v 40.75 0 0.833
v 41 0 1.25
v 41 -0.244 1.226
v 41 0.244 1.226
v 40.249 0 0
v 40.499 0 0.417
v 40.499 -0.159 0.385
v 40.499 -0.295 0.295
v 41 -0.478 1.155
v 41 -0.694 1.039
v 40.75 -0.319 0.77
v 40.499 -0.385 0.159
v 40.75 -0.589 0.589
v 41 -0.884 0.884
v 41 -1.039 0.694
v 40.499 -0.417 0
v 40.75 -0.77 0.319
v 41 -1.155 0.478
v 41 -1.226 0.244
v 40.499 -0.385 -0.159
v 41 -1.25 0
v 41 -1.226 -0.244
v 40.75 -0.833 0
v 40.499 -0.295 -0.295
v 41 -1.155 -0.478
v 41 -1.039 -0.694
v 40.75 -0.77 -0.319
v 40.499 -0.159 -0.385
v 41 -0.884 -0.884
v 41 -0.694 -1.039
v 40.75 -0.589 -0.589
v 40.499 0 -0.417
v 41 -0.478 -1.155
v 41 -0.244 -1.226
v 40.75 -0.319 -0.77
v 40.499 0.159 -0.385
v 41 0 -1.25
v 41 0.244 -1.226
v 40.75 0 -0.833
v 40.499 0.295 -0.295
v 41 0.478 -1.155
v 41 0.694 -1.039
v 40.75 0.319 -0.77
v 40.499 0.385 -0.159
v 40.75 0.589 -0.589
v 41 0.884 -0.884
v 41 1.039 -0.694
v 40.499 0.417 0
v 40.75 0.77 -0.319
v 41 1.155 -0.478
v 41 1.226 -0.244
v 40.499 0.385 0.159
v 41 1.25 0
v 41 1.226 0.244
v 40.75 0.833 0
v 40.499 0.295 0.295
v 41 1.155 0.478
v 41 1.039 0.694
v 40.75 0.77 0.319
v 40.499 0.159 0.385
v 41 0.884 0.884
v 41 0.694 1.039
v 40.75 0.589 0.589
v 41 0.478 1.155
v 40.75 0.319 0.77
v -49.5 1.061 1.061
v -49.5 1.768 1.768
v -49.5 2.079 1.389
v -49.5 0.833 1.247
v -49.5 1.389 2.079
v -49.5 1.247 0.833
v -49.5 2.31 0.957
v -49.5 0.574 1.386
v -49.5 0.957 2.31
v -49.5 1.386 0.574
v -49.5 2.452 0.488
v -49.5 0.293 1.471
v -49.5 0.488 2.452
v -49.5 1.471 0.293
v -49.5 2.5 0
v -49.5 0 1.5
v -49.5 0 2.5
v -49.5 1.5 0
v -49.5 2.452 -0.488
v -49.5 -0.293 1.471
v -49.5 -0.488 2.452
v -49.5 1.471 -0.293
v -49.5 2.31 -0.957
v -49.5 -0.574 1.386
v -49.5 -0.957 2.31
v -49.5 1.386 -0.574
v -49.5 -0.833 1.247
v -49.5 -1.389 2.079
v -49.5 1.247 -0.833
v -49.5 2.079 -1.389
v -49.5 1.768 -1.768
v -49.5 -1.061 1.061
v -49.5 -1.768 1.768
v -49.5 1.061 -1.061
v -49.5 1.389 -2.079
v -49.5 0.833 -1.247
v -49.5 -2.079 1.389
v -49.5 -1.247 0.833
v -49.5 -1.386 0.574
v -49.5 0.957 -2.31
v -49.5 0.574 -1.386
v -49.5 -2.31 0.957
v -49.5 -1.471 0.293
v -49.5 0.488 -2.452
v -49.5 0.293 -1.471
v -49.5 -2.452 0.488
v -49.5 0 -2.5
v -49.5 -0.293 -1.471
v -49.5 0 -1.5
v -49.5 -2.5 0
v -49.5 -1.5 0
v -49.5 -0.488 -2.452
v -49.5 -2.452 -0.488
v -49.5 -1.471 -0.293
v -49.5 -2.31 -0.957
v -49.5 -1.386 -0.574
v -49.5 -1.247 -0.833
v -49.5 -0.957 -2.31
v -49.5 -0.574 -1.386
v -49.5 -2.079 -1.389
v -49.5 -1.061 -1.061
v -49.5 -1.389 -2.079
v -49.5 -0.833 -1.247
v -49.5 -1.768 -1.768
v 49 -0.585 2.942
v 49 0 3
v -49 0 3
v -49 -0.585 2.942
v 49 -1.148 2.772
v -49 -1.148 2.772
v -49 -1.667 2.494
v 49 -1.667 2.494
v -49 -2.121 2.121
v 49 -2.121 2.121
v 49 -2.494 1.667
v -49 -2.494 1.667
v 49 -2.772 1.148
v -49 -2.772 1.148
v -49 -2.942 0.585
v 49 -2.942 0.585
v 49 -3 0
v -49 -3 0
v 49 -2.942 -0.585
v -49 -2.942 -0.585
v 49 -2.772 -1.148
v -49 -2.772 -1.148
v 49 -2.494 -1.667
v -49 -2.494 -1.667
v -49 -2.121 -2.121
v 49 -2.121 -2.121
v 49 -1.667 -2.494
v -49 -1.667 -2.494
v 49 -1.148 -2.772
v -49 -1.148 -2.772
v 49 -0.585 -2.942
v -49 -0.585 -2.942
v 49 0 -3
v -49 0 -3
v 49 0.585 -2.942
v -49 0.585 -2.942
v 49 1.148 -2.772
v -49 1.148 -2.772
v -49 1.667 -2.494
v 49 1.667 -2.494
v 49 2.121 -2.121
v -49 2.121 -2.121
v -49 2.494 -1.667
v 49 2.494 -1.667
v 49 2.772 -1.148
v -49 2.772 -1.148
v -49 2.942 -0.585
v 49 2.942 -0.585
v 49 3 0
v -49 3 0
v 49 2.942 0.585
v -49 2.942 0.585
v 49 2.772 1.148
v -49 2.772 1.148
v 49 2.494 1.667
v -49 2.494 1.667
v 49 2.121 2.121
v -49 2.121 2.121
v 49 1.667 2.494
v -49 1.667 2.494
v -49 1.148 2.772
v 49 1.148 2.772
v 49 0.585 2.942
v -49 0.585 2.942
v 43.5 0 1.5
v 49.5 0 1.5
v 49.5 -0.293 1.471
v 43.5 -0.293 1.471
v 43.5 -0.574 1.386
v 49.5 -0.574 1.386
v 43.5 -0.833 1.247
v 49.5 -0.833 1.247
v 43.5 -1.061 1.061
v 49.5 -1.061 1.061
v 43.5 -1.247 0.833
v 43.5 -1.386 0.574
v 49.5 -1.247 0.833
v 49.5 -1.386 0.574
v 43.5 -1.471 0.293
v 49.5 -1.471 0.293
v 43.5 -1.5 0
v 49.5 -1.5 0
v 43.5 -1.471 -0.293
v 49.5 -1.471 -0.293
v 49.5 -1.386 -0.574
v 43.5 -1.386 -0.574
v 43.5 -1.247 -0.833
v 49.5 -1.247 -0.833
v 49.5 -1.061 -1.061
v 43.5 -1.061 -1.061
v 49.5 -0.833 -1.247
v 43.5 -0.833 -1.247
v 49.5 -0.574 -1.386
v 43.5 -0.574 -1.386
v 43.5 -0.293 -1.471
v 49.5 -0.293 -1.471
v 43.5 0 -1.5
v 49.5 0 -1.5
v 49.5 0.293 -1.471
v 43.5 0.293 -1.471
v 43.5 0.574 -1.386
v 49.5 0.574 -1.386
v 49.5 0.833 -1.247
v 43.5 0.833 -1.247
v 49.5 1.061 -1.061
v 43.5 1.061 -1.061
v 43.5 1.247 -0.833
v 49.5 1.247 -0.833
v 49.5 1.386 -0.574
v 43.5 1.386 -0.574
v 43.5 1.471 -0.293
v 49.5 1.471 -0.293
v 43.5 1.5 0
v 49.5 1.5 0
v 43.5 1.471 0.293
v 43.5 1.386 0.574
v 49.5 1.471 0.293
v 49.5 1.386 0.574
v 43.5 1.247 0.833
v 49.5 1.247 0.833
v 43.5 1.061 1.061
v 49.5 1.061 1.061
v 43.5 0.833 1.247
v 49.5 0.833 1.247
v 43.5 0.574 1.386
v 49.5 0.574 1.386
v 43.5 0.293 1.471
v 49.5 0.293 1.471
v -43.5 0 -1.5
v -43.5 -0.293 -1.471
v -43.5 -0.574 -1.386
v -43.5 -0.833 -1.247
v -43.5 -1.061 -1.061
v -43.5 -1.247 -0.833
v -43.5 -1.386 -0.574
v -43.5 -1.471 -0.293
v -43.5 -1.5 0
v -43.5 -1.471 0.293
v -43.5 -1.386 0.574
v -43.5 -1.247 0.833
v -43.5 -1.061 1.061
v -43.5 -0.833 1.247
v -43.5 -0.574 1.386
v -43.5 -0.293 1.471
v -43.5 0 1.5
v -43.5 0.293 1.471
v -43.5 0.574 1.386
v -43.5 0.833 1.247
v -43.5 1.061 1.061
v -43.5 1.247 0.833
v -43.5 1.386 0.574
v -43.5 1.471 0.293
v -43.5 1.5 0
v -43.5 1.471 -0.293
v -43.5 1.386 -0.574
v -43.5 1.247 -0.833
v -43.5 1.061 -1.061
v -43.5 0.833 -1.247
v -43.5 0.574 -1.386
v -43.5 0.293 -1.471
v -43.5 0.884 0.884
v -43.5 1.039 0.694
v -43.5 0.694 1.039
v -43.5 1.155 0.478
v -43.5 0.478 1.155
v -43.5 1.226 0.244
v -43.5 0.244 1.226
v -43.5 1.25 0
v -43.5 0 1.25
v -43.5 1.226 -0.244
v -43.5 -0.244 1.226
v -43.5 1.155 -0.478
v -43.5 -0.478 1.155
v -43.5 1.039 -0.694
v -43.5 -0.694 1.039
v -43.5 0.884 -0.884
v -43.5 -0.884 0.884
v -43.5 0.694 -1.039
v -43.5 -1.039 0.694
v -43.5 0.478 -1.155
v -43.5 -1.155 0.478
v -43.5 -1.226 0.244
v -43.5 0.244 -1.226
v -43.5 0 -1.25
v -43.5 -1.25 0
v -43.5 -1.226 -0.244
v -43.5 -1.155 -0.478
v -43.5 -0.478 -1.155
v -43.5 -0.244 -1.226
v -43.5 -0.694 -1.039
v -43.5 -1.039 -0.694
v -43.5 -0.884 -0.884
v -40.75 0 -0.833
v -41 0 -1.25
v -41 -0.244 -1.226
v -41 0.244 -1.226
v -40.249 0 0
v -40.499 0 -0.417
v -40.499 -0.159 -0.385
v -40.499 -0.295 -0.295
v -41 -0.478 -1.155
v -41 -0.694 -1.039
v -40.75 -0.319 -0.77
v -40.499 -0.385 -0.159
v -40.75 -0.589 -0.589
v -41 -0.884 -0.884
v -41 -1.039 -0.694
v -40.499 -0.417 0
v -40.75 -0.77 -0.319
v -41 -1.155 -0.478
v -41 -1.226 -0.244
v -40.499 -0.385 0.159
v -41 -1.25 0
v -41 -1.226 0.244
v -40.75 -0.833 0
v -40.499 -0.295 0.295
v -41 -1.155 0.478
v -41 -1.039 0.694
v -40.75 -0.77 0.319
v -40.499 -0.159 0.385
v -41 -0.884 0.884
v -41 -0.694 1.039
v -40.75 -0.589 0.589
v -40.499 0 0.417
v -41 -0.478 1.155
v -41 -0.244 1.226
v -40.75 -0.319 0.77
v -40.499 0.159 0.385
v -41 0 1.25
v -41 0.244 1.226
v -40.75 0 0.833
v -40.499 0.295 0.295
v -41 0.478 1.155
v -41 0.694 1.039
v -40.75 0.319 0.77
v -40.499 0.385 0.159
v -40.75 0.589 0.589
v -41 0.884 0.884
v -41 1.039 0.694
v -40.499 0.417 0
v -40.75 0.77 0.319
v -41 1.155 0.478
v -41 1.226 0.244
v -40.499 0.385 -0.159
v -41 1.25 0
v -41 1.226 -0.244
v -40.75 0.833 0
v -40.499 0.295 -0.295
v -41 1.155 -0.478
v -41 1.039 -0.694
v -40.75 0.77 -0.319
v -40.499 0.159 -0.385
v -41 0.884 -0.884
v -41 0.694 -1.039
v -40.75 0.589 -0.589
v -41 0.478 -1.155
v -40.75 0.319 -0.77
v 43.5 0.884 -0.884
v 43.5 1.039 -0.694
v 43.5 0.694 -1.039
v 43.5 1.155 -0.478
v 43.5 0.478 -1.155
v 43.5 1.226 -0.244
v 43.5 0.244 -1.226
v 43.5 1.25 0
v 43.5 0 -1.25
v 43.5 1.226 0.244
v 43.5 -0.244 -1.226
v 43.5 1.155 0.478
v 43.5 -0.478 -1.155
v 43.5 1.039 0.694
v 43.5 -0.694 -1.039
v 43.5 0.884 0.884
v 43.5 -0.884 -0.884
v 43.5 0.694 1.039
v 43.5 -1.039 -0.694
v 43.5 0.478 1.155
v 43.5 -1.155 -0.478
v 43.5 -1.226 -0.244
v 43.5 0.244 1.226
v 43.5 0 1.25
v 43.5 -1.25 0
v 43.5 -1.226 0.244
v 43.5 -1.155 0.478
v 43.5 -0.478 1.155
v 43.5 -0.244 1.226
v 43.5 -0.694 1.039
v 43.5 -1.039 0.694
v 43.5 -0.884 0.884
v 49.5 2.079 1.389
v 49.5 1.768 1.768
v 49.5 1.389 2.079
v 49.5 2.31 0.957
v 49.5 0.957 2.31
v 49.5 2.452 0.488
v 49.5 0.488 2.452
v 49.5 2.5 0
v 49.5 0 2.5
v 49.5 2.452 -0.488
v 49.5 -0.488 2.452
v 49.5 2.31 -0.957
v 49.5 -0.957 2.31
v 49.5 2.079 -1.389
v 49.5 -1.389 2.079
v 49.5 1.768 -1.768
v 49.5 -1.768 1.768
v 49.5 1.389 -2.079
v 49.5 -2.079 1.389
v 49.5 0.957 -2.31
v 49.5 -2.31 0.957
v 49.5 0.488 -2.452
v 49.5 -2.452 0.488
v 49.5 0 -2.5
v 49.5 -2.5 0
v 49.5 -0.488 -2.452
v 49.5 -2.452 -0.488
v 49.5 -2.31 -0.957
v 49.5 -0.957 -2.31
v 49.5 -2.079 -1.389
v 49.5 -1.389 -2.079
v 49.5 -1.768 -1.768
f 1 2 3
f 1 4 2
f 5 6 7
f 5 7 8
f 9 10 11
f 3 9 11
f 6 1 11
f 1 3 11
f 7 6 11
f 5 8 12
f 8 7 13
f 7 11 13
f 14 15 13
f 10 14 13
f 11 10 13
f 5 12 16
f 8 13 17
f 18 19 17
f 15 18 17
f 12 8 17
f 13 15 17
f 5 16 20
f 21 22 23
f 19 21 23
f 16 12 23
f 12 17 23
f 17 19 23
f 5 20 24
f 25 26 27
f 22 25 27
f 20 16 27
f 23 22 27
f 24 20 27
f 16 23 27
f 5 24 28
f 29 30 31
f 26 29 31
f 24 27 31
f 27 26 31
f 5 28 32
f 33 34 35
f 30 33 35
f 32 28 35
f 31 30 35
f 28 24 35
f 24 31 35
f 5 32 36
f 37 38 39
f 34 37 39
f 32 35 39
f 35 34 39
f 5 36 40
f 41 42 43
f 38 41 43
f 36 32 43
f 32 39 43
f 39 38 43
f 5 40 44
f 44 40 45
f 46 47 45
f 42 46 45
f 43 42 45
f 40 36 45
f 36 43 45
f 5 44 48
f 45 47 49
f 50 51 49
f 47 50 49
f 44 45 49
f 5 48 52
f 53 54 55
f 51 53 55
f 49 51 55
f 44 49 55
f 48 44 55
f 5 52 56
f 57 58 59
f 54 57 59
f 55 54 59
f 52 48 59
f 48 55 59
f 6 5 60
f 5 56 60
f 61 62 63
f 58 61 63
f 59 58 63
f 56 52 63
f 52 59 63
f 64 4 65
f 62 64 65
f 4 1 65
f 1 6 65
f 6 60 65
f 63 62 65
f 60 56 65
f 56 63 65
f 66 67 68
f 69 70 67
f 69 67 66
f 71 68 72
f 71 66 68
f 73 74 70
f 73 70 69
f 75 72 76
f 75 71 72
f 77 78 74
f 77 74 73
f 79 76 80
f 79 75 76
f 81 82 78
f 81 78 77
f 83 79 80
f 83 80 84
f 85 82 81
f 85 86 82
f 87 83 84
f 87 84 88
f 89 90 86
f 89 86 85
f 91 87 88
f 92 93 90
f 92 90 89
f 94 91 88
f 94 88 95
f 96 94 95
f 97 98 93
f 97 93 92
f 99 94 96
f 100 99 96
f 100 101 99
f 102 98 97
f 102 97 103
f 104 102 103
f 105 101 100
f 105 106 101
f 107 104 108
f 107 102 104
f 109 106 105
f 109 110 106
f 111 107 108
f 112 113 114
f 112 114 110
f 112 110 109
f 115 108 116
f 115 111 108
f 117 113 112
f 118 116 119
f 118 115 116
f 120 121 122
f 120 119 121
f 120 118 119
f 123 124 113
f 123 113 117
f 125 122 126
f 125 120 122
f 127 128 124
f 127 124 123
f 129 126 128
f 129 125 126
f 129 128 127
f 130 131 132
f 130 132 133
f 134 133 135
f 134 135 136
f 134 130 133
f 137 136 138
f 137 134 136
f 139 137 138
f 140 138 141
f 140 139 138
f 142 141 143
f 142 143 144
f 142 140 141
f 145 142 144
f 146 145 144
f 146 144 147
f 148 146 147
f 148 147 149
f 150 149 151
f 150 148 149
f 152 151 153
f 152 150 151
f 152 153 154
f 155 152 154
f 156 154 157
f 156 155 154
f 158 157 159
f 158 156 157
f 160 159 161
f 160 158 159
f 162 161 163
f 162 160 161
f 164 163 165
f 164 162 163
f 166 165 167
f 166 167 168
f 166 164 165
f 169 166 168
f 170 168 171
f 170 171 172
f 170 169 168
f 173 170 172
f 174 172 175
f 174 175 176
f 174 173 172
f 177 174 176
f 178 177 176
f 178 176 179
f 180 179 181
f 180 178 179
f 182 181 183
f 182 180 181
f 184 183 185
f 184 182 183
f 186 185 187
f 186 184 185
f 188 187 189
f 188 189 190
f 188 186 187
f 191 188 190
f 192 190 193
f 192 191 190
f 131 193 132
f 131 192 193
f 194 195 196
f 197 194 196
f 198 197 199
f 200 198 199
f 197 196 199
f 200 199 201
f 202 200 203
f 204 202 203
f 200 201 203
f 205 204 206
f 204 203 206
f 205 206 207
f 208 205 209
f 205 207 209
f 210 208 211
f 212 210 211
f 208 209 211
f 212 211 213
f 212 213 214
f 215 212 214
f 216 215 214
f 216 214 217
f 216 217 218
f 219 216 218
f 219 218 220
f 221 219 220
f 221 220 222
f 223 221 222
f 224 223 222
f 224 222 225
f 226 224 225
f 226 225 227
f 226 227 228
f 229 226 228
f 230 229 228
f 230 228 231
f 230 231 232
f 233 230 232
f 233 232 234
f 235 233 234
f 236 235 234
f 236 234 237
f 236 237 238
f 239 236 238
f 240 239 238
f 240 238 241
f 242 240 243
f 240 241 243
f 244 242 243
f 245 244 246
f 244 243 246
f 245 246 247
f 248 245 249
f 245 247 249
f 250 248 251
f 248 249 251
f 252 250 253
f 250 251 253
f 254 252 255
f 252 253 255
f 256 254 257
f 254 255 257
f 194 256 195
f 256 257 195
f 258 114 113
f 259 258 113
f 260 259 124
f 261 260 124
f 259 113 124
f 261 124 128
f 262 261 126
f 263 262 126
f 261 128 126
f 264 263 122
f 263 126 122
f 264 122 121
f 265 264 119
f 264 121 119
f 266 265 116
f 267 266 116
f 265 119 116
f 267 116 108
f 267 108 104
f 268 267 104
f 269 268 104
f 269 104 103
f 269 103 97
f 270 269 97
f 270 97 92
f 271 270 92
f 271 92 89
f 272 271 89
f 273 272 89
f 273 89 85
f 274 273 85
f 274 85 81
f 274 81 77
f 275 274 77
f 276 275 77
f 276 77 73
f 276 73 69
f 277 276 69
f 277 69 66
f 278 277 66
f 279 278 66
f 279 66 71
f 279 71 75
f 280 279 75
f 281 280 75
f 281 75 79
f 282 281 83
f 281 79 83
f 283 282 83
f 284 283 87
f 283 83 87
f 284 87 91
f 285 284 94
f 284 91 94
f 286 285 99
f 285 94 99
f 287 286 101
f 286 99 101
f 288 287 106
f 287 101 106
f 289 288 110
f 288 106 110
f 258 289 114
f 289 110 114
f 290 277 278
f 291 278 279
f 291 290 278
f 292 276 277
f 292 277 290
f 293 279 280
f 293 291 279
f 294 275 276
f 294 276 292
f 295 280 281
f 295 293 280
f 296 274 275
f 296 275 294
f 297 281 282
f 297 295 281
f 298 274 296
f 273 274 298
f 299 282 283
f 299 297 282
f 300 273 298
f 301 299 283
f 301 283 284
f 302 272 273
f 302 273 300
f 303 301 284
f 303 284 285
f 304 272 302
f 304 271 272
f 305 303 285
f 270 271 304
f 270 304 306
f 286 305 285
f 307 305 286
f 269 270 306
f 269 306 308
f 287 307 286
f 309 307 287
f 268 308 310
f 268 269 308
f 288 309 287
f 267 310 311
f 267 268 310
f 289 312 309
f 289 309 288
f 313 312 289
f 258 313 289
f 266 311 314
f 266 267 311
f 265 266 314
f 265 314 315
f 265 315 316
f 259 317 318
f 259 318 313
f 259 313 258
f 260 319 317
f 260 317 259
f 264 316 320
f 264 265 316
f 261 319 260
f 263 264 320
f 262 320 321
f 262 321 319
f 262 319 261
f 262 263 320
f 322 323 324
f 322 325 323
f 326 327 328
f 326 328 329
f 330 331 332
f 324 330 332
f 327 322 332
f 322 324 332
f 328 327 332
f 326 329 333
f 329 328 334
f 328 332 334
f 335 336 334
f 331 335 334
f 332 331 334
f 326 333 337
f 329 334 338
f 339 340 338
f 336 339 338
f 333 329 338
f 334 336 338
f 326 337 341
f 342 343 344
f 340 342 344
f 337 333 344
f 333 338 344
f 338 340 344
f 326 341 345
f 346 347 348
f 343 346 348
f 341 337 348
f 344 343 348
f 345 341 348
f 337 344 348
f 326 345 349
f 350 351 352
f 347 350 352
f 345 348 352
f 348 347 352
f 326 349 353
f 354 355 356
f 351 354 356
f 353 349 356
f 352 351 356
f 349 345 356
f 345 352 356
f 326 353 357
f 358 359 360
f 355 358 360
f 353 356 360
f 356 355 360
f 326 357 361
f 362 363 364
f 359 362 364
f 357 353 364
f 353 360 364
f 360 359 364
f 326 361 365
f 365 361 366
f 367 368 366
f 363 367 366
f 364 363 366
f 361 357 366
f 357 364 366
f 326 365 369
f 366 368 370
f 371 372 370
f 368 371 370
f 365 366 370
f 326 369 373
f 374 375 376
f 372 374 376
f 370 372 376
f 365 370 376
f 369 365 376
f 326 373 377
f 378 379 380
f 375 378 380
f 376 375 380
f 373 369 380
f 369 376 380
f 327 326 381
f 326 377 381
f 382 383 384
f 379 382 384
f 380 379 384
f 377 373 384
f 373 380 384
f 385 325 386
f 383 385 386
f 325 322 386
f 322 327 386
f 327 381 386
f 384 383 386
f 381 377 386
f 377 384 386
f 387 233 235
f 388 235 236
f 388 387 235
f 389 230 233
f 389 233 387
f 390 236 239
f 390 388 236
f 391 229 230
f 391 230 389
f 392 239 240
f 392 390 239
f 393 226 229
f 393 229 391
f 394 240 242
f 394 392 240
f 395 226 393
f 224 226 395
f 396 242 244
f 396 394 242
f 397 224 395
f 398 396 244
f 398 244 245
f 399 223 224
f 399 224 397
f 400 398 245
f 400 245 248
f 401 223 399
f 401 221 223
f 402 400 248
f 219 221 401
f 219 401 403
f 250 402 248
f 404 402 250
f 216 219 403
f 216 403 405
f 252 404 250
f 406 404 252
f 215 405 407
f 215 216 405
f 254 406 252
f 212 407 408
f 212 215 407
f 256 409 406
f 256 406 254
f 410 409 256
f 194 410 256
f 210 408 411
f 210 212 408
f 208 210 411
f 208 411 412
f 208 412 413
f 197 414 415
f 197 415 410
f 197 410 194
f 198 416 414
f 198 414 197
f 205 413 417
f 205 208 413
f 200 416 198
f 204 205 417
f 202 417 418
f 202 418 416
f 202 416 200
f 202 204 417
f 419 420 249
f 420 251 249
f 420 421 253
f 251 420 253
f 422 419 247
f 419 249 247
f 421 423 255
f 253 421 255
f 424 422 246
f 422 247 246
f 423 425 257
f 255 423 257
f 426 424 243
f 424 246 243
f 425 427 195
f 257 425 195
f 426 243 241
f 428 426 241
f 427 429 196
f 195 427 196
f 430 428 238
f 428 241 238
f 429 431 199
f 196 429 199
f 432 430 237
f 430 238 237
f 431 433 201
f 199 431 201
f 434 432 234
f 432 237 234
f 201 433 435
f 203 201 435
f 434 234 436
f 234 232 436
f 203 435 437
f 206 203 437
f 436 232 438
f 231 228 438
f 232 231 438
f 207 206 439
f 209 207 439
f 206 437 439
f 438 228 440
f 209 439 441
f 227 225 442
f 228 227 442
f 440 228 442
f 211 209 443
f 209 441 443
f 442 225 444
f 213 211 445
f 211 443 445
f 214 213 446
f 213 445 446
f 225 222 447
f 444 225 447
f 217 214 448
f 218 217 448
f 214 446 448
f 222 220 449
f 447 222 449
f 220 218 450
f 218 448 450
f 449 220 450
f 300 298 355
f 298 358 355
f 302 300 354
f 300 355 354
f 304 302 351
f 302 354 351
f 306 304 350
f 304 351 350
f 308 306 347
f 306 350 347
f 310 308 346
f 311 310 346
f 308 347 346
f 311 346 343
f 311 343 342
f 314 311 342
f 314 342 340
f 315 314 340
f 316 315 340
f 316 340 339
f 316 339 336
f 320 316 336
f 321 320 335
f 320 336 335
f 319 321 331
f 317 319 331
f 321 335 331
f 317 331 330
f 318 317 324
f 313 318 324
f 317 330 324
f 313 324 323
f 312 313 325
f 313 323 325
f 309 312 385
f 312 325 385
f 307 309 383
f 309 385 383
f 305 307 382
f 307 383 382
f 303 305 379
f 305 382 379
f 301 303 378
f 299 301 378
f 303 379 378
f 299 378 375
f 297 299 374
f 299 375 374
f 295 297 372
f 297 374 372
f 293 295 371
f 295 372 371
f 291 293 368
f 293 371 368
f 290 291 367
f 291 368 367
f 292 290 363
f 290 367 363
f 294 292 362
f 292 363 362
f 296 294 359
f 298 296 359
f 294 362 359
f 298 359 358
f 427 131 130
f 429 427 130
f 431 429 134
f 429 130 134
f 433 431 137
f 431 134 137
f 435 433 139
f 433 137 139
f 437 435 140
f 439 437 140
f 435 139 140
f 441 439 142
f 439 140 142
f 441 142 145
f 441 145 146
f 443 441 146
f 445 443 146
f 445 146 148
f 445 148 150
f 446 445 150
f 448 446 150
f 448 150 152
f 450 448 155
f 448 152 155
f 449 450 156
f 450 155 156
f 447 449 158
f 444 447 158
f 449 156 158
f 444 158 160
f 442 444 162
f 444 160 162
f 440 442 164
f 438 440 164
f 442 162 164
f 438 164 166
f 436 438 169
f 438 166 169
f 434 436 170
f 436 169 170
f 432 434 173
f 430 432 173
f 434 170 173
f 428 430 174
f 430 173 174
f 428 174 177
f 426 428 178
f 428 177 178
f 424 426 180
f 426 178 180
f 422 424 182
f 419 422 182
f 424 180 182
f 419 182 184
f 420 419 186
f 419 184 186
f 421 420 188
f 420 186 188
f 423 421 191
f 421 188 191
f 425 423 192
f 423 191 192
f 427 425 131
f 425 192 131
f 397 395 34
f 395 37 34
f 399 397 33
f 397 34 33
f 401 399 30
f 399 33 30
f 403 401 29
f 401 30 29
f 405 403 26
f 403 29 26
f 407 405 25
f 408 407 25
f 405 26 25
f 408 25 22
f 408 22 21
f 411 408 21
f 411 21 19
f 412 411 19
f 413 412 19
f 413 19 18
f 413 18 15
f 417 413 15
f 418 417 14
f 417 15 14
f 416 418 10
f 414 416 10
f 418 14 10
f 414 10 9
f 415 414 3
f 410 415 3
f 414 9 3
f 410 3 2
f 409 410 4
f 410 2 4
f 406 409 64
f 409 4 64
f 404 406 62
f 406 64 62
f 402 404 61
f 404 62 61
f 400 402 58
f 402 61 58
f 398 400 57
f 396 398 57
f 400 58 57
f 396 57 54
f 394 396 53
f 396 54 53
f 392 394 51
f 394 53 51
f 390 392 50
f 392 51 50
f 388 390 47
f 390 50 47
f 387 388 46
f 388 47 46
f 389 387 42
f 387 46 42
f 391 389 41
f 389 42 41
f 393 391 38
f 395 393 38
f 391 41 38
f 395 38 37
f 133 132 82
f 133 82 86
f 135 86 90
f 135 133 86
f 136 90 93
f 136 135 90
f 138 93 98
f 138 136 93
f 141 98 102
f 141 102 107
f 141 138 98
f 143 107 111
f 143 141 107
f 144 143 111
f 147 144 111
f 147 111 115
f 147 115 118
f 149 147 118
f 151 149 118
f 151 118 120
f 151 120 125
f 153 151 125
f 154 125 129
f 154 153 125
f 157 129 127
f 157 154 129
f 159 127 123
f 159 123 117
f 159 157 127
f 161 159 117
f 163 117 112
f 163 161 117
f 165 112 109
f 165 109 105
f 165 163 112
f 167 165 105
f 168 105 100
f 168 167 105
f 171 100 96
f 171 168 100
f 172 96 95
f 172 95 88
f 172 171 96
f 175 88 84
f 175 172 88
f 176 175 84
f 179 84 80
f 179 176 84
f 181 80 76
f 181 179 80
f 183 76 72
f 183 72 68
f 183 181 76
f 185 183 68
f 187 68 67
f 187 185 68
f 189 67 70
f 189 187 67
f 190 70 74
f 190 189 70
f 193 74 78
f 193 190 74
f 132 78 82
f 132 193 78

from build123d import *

# Parameters (mm, degrees)
SKETCH_1_W                     = 99
SKETCH_1_H                     = 3
CHAMFER_1_SIZE                 = 0.5
M3X0_5_1_D                     = 2.5
M3X0_5_1_DEPTH                 = 8.5
M3X0_5_1_CBORE_D               = 3
M3X0_5_1_CBORE_DEPTH           = 6
M3X0_5_1_TIP                   = 0.751075774
M3X0_5_1_ON_FACE_2_D           = 2.5
M3X0_5_1_ON_FACE_2_DEPTH       = 8.5
M3X0_5_1_ON_FACE_2_CBORE_D     = 3
M3X0_5_1_ON_FACE_2_CBORE_DEPTH = 6
M3X0_5_1_ON_FACE_2_TIP         = 0.751075774


with BuildPart() as part:
    # ｽｹｯﾁ1 → 回転1 (revolve)
    with BuildSketch(Plane.XY, mode=Mode.PRIVATE) as revolve_1_sk:
        with Locations((0, 1.5)):
            Rectangle(SKETCH_1_W, SKETCH_1_H)
    revolve(revolve_1_sk.sketch.rotate(Axis((0, 0, 0), (1, 0, 0)), 90), axis=Axis((0, 0, 0), (1, 0, 0)))

    # 面取り1
    chamfer_1_edges = [part.edges().sort_by_distance(p)[0] for p in [
        (49.5, 0, -3),
        (-49.5, 0, -3),
    ]]
    chamfer(chamfer_1_edges, length=CHAMFER_1_SIZE)

    # M3x0.5 ねじ穴1
    with Locations(Plane(origin=(49.5, 0, 0), x_dir=(0, 0, 1), z_dir=(1, 0, 0))):
        with Locations((0, 0)):
            CounterBoreHole(M3X0_5_1_D / 2, M3X0_5_1_CBORE_D / 2, M3X0_5_1_CBORE_DEPTH, depth=M3X0_5_1_DEPTH)
            with Locations((0, 0, -(M3X0_5_1_DEPTH + M3X0_5_1_TIP / 2))):  # 118° drill point
                Cone(0, M3X0_5_1_D / 2, M3X0_5_1_TIP, mode=Mode.SUBTRACT)

    # M3x0.5 ねじ穴1 on face 2
    with Locations(Plane(origin=(-49.5, 0, 0), x_dir=(0, 0, -1), z_dir=(-1, 0, 0))):
        with Locations((0, 0)):
            CounterBoreHole(M3X0_5_1_ON_FACE_2_D / 2, M3X0_5_1_ON_FACE_2_CBORE_D / 2, M3X0_5_1_ON_FACE_2_CBORE_DEPTH, depth=M3X0_5_1_ON_FACE_2_DEPTH)
            with Locations((0, 0, -(M3X0_5_1_ON_FACE_2_DEPTH + M3X0_5_1_ON_FACE_2_TIP / 2))):  # 118° drill point
                Cone(0, M3X0_5_1_ON_FACE_2_D / 2, M3X0_5_1_ON_FACE_2_TIP, mode=Mode.SUBTRACT)


solid = part.part
